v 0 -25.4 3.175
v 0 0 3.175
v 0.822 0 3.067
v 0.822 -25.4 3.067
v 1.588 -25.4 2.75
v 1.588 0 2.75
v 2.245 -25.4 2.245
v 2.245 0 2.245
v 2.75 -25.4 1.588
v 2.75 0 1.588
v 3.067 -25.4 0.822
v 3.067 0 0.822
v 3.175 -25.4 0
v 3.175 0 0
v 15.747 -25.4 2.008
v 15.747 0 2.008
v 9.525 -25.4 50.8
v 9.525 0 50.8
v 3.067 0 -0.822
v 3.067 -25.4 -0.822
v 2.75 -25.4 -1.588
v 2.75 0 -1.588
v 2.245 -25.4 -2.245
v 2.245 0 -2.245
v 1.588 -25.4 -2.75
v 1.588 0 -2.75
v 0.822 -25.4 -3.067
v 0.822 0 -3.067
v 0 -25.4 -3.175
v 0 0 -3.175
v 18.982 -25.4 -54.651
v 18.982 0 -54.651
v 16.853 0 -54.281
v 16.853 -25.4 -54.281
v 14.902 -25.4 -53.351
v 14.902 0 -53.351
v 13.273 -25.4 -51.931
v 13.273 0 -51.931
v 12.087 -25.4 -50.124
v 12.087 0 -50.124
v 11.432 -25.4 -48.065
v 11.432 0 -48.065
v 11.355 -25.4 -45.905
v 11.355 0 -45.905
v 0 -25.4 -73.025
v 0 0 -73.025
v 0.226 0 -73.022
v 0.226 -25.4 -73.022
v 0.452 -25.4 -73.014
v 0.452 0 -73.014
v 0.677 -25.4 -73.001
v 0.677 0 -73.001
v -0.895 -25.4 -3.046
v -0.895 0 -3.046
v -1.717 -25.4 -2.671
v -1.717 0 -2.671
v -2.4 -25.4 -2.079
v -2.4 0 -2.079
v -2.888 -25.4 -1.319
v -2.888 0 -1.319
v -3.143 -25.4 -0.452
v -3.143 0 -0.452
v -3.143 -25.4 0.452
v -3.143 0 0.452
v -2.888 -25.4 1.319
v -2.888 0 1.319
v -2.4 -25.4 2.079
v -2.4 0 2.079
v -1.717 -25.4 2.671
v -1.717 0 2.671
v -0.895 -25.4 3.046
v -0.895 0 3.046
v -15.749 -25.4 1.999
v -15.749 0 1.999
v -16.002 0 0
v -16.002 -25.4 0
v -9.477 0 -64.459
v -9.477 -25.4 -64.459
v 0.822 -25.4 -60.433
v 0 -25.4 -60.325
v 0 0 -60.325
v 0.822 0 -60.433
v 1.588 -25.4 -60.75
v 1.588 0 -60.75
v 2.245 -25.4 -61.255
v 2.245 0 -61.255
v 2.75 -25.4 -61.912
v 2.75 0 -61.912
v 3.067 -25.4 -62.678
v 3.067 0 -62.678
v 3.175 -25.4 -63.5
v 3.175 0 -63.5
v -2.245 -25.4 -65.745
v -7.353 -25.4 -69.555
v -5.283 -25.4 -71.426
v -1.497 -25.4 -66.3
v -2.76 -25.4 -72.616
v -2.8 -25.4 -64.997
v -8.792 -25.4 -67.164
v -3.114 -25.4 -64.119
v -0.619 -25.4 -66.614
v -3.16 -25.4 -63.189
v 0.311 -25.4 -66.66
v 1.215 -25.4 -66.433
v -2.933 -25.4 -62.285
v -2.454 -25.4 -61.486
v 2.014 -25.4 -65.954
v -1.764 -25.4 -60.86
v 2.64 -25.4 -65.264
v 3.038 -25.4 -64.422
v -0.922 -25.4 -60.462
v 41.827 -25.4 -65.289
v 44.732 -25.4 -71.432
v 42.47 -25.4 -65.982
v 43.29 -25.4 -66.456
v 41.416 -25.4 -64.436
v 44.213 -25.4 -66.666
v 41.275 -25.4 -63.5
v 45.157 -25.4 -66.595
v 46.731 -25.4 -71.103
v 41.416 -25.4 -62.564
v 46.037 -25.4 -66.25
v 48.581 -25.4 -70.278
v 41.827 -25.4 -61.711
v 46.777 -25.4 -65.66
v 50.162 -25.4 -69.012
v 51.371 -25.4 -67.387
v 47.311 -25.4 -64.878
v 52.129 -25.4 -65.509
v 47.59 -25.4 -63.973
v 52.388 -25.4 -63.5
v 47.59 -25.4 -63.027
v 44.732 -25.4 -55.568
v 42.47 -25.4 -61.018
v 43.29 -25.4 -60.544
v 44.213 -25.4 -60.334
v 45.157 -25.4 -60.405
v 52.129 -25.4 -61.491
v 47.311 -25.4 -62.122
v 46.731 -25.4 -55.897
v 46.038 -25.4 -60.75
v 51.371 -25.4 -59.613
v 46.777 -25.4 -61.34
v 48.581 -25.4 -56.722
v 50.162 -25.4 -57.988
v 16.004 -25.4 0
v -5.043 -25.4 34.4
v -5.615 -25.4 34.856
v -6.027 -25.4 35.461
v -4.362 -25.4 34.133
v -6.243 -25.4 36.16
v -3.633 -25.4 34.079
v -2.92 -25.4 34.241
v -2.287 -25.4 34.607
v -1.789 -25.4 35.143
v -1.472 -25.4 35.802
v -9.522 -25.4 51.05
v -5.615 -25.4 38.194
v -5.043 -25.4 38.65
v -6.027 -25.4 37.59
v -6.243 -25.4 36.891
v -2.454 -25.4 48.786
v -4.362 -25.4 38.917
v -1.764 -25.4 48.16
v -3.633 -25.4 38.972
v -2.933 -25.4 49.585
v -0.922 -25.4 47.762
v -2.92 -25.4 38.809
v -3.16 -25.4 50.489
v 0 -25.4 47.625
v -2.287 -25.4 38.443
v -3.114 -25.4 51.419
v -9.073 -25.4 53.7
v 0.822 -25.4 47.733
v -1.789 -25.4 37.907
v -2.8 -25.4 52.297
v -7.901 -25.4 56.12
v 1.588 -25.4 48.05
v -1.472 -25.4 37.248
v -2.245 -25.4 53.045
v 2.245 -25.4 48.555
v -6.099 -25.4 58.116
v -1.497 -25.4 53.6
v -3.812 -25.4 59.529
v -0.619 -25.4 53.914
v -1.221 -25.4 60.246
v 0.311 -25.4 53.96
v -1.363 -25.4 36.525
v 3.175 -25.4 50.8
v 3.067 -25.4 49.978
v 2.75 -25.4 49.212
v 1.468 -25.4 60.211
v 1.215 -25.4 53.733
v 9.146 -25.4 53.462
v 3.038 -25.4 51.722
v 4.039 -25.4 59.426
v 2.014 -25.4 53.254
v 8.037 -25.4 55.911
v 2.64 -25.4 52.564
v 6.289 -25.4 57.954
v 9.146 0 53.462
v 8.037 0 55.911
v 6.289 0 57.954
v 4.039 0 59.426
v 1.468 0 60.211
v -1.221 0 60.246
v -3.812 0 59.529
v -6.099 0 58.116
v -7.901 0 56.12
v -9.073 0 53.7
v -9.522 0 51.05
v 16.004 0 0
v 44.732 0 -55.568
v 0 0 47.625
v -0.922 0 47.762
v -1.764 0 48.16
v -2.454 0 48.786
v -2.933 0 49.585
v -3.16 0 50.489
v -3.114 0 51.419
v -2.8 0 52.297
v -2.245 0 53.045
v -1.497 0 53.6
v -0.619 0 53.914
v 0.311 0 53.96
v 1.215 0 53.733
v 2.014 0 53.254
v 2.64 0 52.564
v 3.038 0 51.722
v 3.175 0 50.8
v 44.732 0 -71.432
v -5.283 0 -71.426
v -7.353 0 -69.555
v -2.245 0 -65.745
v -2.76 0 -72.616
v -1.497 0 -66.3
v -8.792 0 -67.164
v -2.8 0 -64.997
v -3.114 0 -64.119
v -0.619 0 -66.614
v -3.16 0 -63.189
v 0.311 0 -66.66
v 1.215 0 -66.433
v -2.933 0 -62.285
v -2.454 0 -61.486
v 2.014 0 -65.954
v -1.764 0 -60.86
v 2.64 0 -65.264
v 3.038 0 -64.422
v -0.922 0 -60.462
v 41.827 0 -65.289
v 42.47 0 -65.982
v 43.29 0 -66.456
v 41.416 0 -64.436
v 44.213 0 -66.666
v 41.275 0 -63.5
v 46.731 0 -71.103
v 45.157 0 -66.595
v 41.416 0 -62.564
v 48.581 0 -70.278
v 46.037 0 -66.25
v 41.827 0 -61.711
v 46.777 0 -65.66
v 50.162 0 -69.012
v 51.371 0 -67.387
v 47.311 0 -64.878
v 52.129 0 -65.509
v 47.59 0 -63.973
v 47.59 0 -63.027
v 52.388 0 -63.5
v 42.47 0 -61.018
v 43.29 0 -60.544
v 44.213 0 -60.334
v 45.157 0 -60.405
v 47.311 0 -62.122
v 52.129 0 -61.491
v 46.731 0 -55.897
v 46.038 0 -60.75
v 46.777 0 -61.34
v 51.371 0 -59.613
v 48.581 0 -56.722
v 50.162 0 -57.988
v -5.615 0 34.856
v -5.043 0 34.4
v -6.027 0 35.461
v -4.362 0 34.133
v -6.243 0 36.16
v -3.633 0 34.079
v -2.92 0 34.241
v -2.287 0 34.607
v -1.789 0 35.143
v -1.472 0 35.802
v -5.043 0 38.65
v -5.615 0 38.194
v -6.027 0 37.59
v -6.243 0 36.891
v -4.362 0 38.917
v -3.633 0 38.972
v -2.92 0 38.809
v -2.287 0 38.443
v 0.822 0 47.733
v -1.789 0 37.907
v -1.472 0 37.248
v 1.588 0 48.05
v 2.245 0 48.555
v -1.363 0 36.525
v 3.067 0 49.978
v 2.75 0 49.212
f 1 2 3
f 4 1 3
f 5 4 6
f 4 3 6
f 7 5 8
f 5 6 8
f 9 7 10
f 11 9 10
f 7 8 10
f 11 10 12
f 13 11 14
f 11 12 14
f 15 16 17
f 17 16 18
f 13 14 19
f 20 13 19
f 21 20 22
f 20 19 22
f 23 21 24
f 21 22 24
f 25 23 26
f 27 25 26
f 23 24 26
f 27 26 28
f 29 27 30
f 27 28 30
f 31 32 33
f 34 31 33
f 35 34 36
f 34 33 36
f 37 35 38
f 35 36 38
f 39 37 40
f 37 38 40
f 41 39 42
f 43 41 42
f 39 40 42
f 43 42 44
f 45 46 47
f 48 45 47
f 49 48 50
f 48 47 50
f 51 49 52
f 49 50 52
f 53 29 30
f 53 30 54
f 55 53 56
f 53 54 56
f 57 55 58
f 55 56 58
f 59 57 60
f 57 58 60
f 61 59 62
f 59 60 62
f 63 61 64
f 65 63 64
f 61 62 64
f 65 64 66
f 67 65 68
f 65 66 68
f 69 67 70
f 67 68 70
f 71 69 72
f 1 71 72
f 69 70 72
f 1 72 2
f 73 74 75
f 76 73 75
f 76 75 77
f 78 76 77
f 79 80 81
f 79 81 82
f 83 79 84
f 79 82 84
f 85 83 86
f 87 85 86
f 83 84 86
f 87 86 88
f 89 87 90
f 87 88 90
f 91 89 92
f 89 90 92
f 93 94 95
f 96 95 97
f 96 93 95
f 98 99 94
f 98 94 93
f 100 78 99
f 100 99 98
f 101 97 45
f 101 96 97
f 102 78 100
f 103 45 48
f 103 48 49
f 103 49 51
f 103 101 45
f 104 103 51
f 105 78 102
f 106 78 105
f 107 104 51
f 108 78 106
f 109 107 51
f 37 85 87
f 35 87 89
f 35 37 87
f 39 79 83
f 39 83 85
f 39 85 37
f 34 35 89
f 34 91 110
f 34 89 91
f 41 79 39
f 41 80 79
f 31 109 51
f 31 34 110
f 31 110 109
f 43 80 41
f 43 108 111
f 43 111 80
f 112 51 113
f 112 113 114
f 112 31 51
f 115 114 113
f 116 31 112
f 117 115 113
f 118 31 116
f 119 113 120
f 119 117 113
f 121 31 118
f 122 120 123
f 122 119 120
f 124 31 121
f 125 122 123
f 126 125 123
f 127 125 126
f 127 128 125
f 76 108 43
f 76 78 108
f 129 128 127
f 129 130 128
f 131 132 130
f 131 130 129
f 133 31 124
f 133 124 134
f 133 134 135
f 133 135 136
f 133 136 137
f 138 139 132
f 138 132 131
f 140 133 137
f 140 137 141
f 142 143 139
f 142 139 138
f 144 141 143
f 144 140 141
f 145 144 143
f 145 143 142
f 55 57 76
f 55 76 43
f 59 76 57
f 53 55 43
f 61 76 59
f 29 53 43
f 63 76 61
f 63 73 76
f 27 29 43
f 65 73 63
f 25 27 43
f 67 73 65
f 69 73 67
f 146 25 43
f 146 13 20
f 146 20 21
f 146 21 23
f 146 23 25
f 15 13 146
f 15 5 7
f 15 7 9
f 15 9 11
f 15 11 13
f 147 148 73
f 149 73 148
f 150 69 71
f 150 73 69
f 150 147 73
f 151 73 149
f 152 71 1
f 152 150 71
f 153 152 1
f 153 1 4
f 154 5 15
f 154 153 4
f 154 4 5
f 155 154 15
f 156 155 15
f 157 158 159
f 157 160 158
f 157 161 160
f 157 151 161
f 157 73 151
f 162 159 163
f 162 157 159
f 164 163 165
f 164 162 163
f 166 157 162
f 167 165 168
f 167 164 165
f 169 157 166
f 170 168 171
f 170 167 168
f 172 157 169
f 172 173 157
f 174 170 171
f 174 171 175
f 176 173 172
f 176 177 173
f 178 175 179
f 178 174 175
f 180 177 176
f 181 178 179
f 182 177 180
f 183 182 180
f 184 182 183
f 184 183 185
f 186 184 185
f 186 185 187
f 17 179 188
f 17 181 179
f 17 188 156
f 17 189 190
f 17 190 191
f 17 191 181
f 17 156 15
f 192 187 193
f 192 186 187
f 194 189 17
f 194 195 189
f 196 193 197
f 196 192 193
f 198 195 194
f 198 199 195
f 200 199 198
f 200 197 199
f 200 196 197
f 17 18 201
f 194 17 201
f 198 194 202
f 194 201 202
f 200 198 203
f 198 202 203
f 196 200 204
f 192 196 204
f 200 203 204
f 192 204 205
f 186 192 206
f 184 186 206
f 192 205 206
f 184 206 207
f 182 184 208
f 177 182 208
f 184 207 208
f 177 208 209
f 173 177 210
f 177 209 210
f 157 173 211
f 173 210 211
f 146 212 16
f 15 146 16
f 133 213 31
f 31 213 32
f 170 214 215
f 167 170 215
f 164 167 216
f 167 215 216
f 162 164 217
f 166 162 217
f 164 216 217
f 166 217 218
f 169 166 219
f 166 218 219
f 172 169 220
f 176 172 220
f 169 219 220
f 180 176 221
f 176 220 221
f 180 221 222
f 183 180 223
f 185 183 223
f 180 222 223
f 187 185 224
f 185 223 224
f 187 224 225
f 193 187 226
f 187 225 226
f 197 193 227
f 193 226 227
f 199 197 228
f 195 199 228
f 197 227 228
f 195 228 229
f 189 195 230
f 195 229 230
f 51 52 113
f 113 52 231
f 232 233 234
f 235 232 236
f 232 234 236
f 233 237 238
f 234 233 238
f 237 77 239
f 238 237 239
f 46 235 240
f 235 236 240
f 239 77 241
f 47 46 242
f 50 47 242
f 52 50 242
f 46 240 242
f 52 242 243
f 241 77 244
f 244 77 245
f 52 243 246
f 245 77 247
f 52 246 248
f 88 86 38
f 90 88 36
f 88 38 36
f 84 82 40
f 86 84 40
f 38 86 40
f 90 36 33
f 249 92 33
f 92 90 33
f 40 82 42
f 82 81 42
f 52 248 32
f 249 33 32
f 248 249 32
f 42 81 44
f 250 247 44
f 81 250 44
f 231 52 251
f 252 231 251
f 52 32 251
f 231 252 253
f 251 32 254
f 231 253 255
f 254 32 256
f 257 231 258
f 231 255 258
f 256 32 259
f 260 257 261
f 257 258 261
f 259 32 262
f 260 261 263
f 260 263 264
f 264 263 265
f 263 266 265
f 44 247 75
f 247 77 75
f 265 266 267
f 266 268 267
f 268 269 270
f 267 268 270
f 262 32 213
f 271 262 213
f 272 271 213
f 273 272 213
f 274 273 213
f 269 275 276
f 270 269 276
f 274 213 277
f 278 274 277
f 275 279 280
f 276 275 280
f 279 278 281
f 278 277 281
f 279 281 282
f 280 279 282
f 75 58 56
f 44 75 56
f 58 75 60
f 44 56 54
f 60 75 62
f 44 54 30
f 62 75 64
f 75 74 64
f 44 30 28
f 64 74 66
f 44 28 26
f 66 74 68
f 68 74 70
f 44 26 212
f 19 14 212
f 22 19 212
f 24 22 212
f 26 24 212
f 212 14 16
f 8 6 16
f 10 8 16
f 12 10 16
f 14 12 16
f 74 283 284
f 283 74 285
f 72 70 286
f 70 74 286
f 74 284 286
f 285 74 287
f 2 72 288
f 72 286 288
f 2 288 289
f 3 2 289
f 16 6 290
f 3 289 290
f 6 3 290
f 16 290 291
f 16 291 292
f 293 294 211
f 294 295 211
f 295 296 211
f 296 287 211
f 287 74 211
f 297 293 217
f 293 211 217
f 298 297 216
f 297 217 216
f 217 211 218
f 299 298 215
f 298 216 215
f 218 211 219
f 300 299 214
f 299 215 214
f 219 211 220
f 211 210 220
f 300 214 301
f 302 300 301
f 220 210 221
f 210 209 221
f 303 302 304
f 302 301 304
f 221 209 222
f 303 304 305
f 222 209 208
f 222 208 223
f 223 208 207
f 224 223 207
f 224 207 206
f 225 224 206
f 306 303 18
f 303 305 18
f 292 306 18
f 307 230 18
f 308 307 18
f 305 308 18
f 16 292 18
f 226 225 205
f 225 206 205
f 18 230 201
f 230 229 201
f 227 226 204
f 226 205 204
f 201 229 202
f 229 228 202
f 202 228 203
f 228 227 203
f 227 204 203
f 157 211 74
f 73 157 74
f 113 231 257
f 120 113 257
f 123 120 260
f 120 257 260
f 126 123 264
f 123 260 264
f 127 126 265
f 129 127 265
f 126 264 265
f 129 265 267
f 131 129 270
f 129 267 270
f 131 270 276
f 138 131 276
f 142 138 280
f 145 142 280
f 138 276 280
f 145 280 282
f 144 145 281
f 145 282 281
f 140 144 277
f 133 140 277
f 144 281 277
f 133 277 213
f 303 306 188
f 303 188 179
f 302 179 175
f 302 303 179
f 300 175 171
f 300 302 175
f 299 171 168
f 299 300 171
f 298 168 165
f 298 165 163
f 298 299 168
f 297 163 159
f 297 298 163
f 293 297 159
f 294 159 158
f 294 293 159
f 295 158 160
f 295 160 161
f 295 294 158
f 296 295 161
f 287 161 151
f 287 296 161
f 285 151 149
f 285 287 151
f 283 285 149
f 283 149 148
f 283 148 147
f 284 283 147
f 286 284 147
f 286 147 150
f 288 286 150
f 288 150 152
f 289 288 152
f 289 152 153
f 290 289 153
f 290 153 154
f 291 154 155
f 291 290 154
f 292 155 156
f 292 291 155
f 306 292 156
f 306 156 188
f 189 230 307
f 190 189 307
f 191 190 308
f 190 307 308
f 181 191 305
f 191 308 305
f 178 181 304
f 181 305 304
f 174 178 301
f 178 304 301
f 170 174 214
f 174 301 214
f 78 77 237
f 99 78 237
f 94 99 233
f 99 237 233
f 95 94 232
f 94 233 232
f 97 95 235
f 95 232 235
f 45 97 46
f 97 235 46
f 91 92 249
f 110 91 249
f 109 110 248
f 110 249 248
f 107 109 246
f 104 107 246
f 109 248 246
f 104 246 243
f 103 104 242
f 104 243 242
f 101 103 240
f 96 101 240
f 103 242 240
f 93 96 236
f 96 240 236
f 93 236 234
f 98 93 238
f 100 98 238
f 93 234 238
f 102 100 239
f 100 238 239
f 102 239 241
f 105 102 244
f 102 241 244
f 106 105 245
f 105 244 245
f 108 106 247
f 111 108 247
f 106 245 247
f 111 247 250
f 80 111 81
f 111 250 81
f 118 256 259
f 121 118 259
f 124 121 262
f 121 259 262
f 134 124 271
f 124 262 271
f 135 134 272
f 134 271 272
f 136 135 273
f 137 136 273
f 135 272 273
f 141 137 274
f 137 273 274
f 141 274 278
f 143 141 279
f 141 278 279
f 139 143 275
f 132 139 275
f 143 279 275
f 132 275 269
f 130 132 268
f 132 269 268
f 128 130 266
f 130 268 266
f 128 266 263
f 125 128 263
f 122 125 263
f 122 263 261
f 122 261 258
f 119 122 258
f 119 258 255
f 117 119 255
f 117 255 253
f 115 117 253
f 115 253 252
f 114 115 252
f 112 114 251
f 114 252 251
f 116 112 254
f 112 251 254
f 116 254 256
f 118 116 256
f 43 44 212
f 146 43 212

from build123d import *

# Parameters (mm, degrees)
F0_R     = 2.4534575641
F1_DEPTH = 25.4


with BuildPart() as f1:
    # F0 (on Front) → F1 (new body)
    with BuildSketch(Plane.XZ):
        with BuildLine():
            ThreePointArc((-9.5217293486, 51.0495900878), (-6.822864889, 44.1536371069), (0, 41.275))
            ThreePointArc((0, 41.275), (6.7351920908, 44.0648079092), (9.525, 50.8))
            ThreePointArc((9.525, 50.8), (0.1248057582, 60.3241823021), (-9.5217293486, 51.0495900878))
        make_face()
        with BuildLine():
            ThreePointArc((3.175, 50.8), (2.2450640303, 48.5549359697), (0, 47.625))
            ThreePointArc((0, 47.625), (-2.2450640303, 53.0450640303), (3.175, 50.8))
        make_face(mode=Mode.SUBTRACT)
        with BuildLine():
            ThreePointArc((9.525, 50.8), (6.7351920908, 44.0648079092), (0, 41.275))
            Line((0, 41.275), (0, 15.875))
            ThreePointArc((0, 15.875), (10.4912828764, 11.9142187578), (15.747456912, 2.0082892734))
            Line((15.747456912, 2.0082892734), (9.525, 50.8))
        make_face()
        with BuildLine():
            Line((0, 15.875), (0, 41.275))
            ThreePointArc((0, 41.275), (-6.822864889, 44.1536371069), (-9.5217293486, 51.0495900878))
            Line((-9.5217293486, 51.0495900878), (-15.74860511, 1.9992653877))
            ThreePointArc((-15.74860511, 1.9992653877), (-10.4946959692, 11.9112124284), (0, 15.875))
        make_face()
        with Locations((-3.8164881989, 36.5252)):
            Circle(F0_R, mode=Mode.SUBTRACT)
        with BuildLine():
            ThreePointArc((15.747456912, 2.0082892734), (10.4912828764, 11.9142187578), (0, 15.875))
            Line((0, 15.875), (0, 3.175))
            ThreePointArc((0, 3.175), (2.2450640303, 2.2450640303), (3.175, 0))
            ThreePointArc((3.175, 0), (2.2450640303, -2.2450640303), (0, -3.175))
            Line((0, -3.175), (0, -15.875))
            ThreePointArc((0, -15.875), (11.2253201513, -11.2253201513), (15.875, 0))
            ThreePointArc((15.875, 0), (15.8430821414, 1.0061676109), (15.747456912, 2.0082892734))
        make_face()
        with BuildLine():
            Line((0, 3.175), (0, 15.875))
            ThreePointArc((0, 15.875), (-10.4946959692, 11.9112124284), (-15.74860511, 1.9992653877))
            ThreePointArc((-15.74860511, 1.9992653877), (-11.9112124284, -10.4946959692), (0, -15.875))
            Line((0, -15.875), (0, -3.175))
            ThreePointArc((0, -3.175), (-3.175, 0), (0, 3.175))
        make_face()
        with BuildLine():
            Line((16.0035761028, 0), (15.747456912, 2.0082892734))
            ThreePointArc((15.747456912, 2.0082892734), (15.8430821414, 1.0061676109), (15.875, 0))
            ThreePointArc((15.875, 0), (11.2253201513, -11.2253201513), (0, -15.875))
            Line((0, -15.875), (0, -53.975))
            ThreePointArc((0, -53.975), (6.7351920908, -56.7648079092), (9.525, -63.5))
            Line((9.525, -63.5), (36.5125, -63.5))
            ThreePointArc((36.5125, -63.5), (38.9380895153, -57.7883672161), (44.7324052746, -55.5675253854))
            Line((44.7324052746, -55.5675253854), (18.9822637558, -54.6507905531))
            ThreePointArc((18.9822637558, -54.6507905531), (13.2731893708, -51.9307973584), (11.3553673773, -45.9046997726))
            Line((11.3553673773, -45.9046997726), (16.0035761028, 0))
        make_face()
        with BuildLine():
            ThreePointArc((0, -15.875), (-11.9112124284, -10.4946959692), (-15.74860511, 1.9992653877))
            Line((-15.74860511, 1.9992653877), (-16.0024092847, 0))
            Line((-16.0024092847, 0), (-9.4765589271, -64.4594039301))
            ThreePointArc((-9.4765589271, -64.4594039301), (-7.0662559901, -57.1130092154), (0, -53.975))
            Line((0, -53.975), (0, -15.875))
        make_face()
        with BuildLine():
            Line((0, -60.325), (0, -53.975))
            ThreePointArc((0, -53.975), (-7.0662559901, -57.1130092154), (-9.4765589271, -64.4594039301))
            ThreePointArc((-9.4765589271, -64.4594039301), (-6.3869907846, -70.5662559901), (0, -73.025))
            Line((0, -73.025), (0.6773435479, -73.000885786))
            ThreePointArc((0.6773435479, -73.000885786), (6.9705567315, -69.9912990883), (9.525, -63.5))
            Line((9.525, -63.5), (3.175, -63.5))
            ThreePointArc((3.175, -63.5), (-2.2450640303, -65.7450640303), (0, -60.325))
        make_face()
        with BuildLine():
            Line((36.5125, -63.5), (9.525, -63.5))
            ThreePointArc((9.525, -63.5), (6.9705567315, -69.9912990883), (0.6773435479, -73.000885786))
            Line((0.6773435479, -73.000885786), (44.7324052746, -71.4324746146))
            ThreePointArc((44.7324052746, -71.4324746146), (38.9380895153, -69.2116327839), (36.5125, -63.5))
        make_face()
        with BuildLine():
            Line((0.6773435479, -73.000885786), (0, -73.025))
            ThreePointArc((0, -73.025), (0.3388863295, -73.0189695375), (0.6773435479, -73.000885786))
        make_face()
        with BuildLine():
            ThreePointArc((52.3875, -63.5), (50.1616327839, -57.9880895153), (44.7324052746, -55.5675253854))
            ThreePointArc((44.7324052746, -55.5675253854), (38.9380895153, -57.7883672161), (36.5125, -63.5))
            ThreePointArc((36.5125, -63.5), (38.9380895153, -69.2116327839), (44.7324052746, -71.4324746146))
            ThreePointArc((44.7324052746, -71.4324746146), (50.1616327839, -69.0119104847), (52.3875, -63.5))
        make_face()
        with BuildLine():
            ThreePointArc((47.625, -63.5), (44.45, -66.675), (41.275, -63.5))
            ThreePointArc((41.275, -63.5), (44.45, -60.325), (47.625, -63.5))
        make_face(mode=Mode.SUBTRACT)
        with BuildLine():
            ThreePointArc((9.525, -63.5), (6.7351920908, -56.7648079092), (0, -53.975))
            Line((0, -53.975), (0, -60.325))
            ThreePointArc((0, -60.325), (2.2450640303, -61.2549359697), (3.175, -63.5))
            Line((3.175, -63.5), (9.525, -63.5))
        make_face()
    extrude(amount=F1_DEPTH)


solid = f1.part
